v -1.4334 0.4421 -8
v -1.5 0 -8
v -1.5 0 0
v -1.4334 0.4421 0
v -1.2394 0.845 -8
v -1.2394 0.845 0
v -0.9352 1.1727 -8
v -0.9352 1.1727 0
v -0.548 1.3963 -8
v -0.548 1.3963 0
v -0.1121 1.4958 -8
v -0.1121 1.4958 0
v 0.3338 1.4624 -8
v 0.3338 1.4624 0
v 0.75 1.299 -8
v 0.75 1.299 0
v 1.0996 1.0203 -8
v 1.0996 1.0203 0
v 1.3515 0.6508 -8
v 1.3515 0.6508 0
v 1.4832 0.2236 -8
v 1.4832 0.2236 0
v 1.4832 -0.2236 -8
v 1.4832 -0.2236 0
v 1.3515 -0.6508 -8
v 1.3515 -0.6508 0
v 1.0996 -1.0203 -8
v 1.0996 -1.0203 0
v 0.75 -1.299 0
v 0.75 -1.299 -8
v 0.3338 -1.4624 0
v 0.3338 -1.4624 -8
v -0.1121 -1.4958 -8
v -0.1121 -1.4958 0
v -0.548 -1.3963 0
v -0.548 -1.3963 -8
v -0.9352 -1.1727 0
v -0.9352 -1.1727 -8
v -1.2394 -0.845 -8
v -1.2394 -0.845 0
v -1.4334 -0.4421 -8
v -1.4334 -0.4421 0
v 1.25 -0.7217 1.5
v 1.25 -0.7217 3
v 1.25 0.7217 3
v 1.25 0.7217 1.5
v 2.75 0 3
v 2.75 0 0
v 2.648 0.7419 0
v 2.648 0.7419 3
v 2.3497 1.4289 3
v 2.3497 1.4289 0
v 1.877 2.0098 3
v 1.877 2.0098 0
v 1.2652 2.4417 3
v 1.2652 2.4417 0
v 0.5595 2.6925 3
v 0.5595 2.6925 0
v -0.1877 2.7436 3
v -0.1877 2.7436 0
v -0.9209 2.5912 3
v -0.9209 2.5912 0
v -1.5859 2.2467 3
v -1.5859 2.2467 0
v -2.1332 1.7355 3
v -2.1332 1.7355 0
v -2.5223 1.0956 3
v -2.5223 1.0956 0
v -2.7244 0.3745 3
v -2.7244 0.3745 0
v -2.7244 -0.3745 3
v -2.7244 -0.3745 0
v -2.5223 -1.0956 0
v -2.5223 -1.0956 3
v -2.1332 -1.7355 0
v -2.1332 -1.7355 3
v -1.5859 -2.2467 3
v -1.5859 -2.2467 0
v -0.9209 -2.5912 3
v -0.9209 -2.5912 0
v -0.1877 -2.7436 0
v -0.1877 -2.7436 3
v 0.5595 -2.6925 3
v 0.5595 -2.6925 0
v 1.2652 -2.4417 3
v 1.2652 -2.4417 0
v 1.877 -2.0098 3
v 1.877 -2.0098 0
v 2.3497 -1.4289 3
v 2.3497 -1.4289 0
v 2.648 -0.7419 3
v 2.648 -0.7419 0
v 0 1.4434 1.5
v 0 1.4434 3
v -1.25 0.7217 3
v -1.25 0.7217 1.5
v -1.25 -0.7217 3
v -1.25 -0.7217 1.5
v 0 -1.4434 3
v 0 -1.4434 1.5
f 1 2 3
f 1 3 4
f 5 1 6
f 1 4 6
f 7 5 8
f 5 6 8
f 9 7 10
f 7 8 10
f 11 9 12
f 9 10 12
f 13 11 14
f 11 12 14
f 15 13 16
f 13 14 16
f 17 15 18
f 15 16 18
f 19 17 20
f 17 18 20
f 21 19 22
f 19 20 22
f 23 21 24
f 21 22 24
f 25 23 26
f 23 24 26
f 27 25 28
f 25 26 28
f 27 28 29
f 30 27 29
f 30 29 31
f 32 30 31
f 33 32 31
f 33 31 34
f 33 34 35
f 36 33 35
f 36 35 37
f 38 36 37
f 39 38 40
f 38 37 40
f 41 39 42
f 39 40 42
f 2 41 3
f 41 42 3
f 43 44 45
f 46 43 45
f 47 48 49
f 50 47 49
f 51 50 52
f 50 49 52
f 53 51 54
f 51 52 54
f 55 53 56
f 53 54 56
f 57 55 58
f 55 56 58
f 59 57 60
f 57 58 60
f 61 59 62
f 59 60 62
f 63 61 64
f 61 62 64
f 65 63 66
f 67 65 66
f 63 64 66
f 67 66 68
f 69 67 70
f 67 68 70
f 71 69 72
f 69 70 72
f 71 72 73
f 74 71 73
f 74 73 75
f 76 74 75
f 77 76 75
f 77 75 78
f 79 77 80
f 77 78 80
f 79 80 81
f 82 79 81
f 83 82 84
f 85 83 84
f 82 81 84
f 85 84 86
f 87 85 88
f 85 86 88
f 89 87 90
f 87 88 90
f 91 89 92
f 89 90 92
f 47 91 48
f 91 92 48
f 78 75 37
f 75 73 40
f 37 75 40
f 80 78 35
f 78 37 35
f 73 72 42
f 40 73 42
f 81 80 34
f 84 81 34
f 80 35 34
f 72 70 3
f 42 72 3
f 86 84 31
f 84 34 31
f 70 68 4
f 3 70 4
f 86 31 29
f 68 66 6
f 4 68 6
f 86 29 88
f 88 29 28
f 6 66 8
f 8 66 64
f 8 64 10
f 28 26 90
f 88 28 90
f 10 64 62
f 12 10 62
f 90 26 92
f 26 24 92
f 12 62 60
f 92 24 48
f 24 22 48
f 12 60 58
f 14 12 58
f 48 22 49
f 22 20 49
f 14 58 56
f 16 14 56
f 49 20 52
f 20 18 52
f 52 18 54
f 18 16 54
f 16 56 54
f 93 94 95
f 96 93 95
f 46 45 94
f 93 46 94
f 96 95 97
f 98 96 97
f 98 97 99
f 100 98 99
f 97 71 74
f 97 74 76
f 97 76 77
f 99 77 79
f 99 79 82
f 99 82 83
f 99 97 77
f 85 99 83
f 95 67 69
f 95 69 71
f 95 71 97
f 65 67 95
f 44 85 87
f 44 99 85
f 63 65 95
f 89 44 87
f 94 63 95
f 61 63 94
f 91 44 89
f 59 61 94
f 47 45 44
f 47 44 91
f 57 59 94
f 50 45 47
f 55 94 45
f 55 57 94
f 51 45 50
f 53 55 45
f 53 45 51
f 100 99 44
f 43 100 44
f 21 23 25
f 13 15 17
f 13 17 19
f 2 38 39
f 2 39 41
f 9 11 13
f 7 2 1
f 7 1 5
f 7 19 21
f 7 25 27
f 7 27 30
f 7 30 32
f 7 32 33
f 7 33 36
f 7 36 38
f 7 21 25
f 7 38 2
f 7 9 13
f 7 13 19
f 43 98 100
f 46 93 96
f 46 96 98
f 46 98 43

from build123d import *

# Parameters (mm, degrees)
SKETCH_1_R          = 2.75
EXTRUDE_1_DEPTH     = 3
CUT_EXTRUDE_1_DEPTH = 1.5
SKETCH_3_R          = 1.5
EXTRUDE_2_DEPTH     = 8


with BuildPart() as part:
    # 草图1 → 凸台-拉伸1 (new body)
    with BuildSketch(Plane.XY):
        Circle(SKETCH_1_R)
    extrude(amount=EXTRUDE_1_DEPTH)

    # 草图2 → 切除-拉伸1 (cut)
    with BuildSketch(Plane.XY.offset(3)):
        Polygon((0, -1.443375673), (1.25, -0.721687836), (1.25, 0.721687836), (0, 1.443375673), (-1.25, 0.721687836), (-1.25, -0.721687836), align=None)
    extrude(amount=-CUT_EXTRUDE_1_DEPTH, mode=Mode.SUBTRACT)

    # 草图3 → 凸台-拉伸2 (add)
    with BuildSketch(Plane(origin=(0, 0, 0), x_dir=(-1, 0, 0), z_dir=(0, 0, -1))):
        Circle(SKETCH_3_R)
    extrude(amount=EXTRUDE_2_DEPTH)


solid = part.part
